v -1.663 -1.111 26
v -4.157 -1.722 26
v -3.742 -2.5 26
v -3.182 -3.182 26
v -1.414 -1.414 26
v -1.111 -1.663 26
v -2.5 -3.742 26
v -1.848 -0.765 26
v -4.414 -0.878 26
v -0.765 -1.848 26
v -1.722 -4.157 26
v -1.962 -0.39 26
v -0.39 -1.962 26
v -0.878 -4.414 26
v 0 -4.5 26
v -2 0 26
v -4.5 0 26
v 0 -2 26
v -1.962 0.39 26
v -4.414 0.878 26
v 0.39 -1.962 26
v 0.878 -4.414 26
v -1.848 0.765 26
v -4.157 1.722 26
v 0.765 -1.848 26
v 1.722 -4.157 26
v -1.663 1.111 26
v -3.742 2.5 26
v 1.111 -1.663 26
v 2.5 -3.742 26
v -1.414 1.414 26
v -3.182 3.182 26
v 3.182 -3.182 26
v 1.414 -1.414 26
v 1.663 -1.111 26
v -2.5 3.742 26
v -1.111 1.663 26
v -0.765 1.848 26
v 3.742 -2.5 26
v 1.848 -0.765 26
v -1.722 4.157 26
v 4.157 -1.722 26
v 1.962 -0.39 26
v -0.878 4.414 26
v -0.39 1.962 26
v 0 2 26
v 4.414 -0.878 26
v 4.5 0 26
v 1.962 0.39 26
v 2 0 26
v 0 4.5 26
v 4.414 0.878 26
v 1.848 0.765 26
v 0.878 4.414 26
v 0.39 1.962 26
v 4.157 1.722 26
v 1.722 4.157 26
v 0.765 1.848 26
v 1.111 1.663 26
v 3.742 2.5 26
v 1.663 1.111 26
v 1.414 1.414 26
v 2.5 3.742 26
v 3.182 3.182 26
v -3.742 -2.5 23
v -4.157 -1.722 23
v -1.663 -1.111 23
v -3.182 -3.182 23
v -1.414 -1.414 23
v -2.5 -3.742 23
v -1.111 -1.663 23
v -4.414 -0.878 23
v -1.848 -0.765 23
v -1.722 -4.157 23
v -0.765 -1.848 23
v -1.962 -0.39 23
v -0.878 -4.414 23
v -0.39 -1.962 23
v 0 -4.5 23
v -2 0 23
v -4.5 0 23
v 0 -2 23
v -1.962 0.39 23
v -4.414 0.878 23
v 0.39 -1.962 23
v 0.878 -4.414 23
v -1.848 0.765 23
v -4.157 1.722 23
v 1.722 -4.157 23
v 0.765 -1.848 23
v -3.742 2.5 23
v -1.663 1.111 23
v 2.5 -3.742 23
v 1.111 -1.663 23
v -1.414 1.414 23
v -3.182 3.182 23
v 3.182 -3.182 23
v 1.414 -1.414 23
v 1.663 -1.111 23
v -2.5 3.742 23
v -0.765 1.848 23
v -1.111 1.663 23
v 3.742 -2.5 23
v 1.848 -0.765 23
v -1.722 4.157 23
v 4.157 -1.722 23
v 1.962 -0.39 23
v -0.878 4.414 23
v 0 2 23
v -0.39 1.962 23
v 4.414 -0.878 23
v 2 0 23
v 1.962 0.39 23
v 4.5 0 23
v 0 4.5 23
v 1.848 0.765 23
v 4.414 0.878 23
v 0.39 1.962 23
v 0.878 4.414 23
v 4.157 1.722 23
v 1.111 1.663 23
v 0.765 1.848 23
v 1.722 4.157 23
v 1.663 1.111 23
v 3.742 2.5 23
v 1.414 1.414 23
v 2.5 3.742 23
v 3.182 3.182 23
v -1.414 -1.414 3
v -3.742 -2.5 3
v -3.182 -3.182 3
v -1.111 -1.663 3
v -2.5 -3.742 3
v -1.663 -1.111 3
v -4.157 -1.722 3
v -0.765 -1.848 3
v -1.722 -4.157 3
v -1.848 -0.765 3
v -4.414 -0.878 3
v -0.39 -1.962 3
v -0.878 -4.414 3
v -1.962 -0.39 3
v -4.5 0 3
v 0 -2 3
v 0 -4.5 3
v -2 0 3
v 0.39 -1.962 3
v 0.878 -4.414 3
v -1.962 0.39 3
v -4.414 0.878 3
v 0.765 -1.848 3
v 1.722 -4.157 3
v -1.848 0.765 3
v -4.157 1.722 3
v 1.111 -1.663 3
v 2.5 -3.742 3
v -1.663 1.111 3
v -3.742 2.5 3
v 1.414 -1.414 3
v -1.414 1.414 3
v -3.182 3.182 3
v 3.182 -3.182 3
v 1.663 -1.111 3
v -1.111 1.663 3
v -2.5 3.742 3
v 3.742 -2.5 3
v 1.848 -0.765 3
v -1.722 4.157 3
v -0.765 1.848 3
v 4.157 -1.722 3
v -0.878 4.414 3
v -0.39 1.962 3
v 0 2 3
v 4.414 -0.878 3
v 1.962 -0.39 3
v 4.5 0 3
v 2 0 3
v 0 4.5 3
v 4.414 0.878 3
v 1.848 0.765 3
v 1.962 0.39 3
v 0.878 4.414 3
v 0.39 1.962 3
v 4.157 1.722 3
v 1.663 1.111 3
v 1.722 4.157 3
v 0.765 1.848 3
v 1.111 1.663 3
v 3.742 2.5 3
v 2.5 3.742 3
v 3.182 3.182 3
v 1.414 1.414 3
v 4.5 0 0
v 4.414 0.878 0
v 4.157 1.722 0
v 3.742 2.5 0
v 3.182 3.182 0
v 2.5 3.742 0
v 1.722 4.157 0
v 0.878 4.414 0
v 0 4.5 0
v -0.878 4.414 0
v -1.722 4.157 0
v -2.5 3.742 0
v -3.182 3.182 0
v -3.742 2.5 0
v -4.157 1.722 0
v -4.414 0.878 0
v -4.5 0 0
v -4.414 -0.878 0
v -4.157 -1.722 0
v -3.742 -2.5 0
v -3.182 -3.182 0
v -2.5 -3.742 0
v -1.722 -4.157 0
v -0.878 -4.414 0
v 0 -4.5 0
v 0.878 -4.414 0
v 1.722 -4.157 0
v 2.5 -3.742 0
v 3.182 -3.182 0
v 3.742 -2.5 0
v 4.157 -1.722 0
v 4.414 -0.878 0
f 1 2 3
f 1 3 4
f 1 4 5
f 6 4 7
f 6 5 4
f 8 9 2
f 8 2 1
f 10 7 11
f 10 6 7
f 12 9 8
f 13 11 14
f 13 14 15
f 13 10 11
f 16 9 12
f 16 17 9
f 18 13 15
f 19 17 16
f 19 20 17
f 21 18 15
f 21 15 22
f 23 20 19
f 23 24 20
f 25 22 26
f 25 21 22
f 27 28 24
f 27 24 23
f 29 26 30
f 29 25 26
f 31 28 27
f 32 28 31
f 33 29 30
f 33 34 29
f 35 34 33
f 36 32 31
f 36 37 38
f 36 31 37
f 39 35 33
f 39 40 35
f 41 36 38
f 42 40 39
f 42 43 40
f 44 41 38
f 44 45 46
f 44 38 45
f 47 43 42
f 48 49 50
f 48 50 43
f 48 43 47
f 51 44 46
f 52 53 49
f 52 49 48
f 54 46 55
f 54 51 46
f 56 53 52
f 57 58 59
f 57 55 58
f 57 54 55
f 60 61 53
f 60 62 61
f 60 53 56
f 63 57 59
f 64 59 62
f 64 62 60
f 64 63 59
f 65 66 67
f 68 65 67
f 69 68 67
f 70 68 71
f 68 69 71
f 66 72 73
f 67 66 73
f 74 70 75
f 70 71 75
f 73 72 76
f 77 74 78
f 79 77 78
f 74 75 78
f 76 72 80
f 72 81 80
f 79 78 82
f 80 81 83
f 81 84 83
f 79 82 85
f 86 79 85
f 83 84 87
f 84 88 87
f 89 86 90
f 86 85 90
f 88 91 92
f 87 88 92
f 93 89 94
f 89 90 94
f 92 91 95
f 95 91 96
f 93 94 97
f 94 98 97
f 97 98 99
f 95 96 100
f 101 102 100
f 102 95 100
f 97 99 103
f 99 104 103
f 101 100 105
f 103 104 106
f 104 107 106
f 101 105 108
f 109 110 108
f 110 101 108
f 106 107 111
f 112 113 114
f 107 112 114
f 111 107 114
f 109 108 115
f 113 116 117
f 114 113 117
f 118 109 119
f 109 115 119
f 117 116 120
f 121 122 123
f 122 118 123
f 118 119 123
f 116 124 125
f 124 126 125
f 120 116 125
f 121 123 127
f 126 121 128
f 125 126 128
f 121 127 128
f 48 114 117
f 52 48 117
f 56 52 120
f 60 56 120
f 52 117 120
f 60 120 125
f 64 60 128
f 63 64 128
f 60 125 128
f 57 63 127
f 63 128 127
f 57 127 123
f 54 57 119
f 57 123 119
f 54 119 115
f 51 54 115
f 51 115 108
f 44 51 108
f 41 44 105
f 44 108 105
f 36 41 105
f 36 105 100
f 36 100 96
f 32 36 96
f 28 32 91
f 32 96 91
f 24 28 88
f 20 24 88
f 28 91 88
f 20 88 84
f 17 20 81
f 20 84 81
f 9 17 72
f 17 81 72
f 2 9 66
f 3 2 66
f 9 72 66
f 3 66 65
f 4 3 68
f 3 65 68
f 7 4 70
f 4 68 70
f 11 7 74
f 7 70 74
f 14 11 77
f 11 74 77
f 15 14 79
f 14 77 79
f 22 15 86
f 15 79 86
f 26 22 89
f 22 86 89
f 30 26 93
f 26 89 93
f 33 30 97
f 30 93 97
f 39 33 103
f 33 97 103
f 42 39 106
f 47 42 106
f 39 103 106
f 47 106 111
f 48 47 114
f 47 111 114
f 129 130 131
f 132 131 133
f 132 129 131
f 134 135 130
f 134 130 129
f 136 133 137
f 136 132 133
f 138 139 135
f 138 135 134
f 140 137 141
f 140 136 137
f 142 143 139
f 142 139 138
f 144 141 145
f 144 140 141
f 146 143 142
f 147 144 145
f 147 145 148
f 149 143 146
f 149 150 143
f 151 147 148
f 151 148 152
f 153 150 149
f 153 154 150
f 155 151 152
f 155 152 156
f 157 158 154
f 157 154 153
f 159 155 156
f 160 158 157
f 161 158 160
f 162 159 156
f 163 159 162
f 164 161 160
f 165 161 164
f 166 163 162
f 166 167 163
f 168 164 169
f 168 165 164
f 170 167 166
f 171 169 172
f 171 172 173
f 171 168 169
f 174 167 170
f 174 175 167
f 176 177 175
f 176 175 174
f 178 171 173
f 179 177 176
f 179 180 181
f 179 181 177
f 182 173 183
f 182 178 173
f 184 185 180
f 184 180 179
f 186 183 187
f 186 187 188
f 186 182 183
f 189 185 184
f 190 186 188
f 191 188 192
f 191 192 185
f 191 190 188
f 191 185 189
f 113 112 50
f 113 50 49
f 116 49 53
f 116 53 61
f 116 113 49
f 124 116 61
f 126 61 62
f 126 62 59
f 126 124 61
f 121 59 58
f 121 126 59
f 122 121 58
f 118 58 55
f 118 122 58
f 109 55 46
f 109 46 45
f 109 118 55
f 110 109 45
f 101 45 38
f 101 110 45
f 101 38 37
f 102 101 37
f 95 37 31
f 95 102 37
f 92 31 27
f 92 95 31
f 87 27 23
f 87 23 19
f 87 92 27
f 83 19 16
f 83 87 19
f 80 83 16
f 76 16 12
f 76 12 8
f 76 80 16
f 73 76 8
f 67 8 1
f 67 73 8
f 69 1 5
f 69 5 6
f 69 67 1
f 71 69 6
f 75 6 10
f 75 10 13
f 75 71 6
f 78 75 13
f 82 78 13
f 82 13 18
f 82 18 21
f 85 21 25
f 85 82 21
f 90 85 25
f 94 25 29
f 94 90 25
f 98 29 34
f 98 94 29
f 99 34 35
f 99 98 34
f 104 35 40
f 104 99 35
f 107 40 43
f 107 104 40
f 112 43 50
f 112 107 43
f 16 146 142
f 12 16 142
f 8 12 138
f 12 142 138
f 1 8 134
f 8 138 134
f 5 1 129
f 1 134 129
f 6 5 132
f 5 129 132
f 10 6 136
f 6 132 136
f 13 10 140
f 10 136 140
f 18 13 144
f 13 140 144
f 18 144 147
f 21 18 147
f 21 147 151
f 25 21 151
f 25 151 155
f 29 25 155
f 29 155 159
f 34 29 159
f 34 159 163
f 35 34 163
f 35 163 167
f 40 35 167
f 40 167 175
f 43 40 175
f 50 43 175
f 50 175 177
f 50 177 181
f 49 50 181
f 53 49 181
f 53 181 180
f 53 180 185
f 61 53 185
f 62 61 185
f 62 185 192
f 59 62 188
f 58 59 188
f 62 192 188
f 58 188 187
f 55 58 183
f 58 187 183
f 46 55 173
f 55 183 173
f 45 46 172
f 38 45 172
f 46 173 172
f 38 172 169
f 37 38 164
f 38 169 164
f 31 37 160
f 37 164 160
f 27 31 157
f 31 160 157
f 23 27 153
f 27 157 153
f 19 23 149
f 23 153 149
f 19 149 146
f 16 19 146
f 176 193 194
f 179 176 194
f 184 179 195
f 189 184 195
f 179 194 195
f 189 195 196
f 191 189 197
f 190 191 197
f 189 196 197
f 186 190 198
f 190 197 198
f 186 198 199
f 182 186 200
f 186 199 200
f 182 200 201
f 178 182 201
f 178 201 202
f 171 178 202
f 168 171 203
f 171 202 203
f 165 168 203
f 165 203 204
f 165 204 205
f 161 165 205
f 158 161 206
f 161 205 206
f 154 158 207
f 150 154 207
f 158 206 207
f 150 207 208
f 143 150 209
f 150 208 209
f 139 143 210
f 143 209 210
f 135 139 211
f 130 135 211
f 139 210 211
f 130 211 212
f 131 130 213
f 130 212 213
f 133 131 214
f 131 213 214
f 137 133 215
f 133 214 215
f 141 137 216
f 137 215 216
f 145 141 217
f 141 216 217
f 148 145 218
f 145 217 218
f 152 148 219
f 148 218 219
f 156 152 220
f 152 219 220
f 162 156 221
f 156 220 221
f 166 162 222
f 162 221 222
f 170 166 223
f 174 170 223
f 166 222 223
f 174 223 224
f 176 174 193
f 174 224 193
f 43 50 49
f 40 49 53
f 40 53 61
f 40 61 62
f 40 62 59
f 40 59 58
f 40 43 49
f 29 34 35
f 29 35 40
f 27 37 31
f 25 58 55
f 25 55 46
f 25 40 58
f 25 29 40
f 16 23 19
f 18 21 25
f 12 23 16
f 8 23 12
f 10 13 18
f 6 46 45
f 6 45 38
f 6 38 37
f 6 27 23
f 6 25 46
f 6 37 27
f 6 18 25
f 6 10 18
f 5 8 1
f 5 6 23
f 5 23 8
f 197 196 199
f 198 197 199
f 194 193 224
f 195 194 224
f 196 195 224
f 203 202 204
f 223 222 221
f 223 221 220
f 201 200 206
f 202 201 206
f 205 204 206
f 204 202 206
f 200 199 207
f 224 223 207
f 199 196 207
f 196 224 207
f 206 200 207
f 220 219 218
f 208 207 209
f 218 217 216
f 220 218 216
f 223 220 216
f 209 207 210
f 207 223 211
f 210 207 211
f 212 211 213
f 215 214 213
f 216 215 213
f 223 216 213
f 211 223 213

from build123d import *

# Parameters (mm, degrees)
CROQUIS1_R              = 4.5
SALIENTE_EXTRUIR1_DEPTH = 3
CROQUIS2_R              = 2
SALIENTE_EXTRUIR2_DEPTH = 26
SALIENTE_EXTRUIR3_START = 23
CROQUIS4_R              = 4.5
CROQUIS4_R_2            = 2
SALIENTE_EXTRUIR3_DEPTH = 3


with BuildPart() as part:
    # Croquis1 → Saliente-Extruir1 (new body)
    with BuildSketch(Plane.XY):
        Circle(CROQUIS1_R)
    extrude(amount=SALIENTE_EXTRUIR1_DEPTH)

    # Croquis2 → Saliente-Extruir2 (add)
    with BuildSketch(Plane.XY):
        with Locations(Location((0, 0, 0), (0, 0, 180))):
            Circle(CROQUIS2_R)
    extrude(amount=SALIENTE_EXTRUIR2_DEPTH)


with BuildPart() as body_2:
    # Croquis4 → Saliente-Extruir3 (new body)
    with BuildSketch(Plane.XY.offset(SALIENTE_EXTRUIR3_START)):
        Circle(CROQUIS4_R)
        Circle(CROQUIS4_R_2, mode=Mode.SUBTRACT)
    extrude(amount=SALIENTE_EXTRUIR3_DEPTH)


solid = Compound([part.part, body_2.part])
